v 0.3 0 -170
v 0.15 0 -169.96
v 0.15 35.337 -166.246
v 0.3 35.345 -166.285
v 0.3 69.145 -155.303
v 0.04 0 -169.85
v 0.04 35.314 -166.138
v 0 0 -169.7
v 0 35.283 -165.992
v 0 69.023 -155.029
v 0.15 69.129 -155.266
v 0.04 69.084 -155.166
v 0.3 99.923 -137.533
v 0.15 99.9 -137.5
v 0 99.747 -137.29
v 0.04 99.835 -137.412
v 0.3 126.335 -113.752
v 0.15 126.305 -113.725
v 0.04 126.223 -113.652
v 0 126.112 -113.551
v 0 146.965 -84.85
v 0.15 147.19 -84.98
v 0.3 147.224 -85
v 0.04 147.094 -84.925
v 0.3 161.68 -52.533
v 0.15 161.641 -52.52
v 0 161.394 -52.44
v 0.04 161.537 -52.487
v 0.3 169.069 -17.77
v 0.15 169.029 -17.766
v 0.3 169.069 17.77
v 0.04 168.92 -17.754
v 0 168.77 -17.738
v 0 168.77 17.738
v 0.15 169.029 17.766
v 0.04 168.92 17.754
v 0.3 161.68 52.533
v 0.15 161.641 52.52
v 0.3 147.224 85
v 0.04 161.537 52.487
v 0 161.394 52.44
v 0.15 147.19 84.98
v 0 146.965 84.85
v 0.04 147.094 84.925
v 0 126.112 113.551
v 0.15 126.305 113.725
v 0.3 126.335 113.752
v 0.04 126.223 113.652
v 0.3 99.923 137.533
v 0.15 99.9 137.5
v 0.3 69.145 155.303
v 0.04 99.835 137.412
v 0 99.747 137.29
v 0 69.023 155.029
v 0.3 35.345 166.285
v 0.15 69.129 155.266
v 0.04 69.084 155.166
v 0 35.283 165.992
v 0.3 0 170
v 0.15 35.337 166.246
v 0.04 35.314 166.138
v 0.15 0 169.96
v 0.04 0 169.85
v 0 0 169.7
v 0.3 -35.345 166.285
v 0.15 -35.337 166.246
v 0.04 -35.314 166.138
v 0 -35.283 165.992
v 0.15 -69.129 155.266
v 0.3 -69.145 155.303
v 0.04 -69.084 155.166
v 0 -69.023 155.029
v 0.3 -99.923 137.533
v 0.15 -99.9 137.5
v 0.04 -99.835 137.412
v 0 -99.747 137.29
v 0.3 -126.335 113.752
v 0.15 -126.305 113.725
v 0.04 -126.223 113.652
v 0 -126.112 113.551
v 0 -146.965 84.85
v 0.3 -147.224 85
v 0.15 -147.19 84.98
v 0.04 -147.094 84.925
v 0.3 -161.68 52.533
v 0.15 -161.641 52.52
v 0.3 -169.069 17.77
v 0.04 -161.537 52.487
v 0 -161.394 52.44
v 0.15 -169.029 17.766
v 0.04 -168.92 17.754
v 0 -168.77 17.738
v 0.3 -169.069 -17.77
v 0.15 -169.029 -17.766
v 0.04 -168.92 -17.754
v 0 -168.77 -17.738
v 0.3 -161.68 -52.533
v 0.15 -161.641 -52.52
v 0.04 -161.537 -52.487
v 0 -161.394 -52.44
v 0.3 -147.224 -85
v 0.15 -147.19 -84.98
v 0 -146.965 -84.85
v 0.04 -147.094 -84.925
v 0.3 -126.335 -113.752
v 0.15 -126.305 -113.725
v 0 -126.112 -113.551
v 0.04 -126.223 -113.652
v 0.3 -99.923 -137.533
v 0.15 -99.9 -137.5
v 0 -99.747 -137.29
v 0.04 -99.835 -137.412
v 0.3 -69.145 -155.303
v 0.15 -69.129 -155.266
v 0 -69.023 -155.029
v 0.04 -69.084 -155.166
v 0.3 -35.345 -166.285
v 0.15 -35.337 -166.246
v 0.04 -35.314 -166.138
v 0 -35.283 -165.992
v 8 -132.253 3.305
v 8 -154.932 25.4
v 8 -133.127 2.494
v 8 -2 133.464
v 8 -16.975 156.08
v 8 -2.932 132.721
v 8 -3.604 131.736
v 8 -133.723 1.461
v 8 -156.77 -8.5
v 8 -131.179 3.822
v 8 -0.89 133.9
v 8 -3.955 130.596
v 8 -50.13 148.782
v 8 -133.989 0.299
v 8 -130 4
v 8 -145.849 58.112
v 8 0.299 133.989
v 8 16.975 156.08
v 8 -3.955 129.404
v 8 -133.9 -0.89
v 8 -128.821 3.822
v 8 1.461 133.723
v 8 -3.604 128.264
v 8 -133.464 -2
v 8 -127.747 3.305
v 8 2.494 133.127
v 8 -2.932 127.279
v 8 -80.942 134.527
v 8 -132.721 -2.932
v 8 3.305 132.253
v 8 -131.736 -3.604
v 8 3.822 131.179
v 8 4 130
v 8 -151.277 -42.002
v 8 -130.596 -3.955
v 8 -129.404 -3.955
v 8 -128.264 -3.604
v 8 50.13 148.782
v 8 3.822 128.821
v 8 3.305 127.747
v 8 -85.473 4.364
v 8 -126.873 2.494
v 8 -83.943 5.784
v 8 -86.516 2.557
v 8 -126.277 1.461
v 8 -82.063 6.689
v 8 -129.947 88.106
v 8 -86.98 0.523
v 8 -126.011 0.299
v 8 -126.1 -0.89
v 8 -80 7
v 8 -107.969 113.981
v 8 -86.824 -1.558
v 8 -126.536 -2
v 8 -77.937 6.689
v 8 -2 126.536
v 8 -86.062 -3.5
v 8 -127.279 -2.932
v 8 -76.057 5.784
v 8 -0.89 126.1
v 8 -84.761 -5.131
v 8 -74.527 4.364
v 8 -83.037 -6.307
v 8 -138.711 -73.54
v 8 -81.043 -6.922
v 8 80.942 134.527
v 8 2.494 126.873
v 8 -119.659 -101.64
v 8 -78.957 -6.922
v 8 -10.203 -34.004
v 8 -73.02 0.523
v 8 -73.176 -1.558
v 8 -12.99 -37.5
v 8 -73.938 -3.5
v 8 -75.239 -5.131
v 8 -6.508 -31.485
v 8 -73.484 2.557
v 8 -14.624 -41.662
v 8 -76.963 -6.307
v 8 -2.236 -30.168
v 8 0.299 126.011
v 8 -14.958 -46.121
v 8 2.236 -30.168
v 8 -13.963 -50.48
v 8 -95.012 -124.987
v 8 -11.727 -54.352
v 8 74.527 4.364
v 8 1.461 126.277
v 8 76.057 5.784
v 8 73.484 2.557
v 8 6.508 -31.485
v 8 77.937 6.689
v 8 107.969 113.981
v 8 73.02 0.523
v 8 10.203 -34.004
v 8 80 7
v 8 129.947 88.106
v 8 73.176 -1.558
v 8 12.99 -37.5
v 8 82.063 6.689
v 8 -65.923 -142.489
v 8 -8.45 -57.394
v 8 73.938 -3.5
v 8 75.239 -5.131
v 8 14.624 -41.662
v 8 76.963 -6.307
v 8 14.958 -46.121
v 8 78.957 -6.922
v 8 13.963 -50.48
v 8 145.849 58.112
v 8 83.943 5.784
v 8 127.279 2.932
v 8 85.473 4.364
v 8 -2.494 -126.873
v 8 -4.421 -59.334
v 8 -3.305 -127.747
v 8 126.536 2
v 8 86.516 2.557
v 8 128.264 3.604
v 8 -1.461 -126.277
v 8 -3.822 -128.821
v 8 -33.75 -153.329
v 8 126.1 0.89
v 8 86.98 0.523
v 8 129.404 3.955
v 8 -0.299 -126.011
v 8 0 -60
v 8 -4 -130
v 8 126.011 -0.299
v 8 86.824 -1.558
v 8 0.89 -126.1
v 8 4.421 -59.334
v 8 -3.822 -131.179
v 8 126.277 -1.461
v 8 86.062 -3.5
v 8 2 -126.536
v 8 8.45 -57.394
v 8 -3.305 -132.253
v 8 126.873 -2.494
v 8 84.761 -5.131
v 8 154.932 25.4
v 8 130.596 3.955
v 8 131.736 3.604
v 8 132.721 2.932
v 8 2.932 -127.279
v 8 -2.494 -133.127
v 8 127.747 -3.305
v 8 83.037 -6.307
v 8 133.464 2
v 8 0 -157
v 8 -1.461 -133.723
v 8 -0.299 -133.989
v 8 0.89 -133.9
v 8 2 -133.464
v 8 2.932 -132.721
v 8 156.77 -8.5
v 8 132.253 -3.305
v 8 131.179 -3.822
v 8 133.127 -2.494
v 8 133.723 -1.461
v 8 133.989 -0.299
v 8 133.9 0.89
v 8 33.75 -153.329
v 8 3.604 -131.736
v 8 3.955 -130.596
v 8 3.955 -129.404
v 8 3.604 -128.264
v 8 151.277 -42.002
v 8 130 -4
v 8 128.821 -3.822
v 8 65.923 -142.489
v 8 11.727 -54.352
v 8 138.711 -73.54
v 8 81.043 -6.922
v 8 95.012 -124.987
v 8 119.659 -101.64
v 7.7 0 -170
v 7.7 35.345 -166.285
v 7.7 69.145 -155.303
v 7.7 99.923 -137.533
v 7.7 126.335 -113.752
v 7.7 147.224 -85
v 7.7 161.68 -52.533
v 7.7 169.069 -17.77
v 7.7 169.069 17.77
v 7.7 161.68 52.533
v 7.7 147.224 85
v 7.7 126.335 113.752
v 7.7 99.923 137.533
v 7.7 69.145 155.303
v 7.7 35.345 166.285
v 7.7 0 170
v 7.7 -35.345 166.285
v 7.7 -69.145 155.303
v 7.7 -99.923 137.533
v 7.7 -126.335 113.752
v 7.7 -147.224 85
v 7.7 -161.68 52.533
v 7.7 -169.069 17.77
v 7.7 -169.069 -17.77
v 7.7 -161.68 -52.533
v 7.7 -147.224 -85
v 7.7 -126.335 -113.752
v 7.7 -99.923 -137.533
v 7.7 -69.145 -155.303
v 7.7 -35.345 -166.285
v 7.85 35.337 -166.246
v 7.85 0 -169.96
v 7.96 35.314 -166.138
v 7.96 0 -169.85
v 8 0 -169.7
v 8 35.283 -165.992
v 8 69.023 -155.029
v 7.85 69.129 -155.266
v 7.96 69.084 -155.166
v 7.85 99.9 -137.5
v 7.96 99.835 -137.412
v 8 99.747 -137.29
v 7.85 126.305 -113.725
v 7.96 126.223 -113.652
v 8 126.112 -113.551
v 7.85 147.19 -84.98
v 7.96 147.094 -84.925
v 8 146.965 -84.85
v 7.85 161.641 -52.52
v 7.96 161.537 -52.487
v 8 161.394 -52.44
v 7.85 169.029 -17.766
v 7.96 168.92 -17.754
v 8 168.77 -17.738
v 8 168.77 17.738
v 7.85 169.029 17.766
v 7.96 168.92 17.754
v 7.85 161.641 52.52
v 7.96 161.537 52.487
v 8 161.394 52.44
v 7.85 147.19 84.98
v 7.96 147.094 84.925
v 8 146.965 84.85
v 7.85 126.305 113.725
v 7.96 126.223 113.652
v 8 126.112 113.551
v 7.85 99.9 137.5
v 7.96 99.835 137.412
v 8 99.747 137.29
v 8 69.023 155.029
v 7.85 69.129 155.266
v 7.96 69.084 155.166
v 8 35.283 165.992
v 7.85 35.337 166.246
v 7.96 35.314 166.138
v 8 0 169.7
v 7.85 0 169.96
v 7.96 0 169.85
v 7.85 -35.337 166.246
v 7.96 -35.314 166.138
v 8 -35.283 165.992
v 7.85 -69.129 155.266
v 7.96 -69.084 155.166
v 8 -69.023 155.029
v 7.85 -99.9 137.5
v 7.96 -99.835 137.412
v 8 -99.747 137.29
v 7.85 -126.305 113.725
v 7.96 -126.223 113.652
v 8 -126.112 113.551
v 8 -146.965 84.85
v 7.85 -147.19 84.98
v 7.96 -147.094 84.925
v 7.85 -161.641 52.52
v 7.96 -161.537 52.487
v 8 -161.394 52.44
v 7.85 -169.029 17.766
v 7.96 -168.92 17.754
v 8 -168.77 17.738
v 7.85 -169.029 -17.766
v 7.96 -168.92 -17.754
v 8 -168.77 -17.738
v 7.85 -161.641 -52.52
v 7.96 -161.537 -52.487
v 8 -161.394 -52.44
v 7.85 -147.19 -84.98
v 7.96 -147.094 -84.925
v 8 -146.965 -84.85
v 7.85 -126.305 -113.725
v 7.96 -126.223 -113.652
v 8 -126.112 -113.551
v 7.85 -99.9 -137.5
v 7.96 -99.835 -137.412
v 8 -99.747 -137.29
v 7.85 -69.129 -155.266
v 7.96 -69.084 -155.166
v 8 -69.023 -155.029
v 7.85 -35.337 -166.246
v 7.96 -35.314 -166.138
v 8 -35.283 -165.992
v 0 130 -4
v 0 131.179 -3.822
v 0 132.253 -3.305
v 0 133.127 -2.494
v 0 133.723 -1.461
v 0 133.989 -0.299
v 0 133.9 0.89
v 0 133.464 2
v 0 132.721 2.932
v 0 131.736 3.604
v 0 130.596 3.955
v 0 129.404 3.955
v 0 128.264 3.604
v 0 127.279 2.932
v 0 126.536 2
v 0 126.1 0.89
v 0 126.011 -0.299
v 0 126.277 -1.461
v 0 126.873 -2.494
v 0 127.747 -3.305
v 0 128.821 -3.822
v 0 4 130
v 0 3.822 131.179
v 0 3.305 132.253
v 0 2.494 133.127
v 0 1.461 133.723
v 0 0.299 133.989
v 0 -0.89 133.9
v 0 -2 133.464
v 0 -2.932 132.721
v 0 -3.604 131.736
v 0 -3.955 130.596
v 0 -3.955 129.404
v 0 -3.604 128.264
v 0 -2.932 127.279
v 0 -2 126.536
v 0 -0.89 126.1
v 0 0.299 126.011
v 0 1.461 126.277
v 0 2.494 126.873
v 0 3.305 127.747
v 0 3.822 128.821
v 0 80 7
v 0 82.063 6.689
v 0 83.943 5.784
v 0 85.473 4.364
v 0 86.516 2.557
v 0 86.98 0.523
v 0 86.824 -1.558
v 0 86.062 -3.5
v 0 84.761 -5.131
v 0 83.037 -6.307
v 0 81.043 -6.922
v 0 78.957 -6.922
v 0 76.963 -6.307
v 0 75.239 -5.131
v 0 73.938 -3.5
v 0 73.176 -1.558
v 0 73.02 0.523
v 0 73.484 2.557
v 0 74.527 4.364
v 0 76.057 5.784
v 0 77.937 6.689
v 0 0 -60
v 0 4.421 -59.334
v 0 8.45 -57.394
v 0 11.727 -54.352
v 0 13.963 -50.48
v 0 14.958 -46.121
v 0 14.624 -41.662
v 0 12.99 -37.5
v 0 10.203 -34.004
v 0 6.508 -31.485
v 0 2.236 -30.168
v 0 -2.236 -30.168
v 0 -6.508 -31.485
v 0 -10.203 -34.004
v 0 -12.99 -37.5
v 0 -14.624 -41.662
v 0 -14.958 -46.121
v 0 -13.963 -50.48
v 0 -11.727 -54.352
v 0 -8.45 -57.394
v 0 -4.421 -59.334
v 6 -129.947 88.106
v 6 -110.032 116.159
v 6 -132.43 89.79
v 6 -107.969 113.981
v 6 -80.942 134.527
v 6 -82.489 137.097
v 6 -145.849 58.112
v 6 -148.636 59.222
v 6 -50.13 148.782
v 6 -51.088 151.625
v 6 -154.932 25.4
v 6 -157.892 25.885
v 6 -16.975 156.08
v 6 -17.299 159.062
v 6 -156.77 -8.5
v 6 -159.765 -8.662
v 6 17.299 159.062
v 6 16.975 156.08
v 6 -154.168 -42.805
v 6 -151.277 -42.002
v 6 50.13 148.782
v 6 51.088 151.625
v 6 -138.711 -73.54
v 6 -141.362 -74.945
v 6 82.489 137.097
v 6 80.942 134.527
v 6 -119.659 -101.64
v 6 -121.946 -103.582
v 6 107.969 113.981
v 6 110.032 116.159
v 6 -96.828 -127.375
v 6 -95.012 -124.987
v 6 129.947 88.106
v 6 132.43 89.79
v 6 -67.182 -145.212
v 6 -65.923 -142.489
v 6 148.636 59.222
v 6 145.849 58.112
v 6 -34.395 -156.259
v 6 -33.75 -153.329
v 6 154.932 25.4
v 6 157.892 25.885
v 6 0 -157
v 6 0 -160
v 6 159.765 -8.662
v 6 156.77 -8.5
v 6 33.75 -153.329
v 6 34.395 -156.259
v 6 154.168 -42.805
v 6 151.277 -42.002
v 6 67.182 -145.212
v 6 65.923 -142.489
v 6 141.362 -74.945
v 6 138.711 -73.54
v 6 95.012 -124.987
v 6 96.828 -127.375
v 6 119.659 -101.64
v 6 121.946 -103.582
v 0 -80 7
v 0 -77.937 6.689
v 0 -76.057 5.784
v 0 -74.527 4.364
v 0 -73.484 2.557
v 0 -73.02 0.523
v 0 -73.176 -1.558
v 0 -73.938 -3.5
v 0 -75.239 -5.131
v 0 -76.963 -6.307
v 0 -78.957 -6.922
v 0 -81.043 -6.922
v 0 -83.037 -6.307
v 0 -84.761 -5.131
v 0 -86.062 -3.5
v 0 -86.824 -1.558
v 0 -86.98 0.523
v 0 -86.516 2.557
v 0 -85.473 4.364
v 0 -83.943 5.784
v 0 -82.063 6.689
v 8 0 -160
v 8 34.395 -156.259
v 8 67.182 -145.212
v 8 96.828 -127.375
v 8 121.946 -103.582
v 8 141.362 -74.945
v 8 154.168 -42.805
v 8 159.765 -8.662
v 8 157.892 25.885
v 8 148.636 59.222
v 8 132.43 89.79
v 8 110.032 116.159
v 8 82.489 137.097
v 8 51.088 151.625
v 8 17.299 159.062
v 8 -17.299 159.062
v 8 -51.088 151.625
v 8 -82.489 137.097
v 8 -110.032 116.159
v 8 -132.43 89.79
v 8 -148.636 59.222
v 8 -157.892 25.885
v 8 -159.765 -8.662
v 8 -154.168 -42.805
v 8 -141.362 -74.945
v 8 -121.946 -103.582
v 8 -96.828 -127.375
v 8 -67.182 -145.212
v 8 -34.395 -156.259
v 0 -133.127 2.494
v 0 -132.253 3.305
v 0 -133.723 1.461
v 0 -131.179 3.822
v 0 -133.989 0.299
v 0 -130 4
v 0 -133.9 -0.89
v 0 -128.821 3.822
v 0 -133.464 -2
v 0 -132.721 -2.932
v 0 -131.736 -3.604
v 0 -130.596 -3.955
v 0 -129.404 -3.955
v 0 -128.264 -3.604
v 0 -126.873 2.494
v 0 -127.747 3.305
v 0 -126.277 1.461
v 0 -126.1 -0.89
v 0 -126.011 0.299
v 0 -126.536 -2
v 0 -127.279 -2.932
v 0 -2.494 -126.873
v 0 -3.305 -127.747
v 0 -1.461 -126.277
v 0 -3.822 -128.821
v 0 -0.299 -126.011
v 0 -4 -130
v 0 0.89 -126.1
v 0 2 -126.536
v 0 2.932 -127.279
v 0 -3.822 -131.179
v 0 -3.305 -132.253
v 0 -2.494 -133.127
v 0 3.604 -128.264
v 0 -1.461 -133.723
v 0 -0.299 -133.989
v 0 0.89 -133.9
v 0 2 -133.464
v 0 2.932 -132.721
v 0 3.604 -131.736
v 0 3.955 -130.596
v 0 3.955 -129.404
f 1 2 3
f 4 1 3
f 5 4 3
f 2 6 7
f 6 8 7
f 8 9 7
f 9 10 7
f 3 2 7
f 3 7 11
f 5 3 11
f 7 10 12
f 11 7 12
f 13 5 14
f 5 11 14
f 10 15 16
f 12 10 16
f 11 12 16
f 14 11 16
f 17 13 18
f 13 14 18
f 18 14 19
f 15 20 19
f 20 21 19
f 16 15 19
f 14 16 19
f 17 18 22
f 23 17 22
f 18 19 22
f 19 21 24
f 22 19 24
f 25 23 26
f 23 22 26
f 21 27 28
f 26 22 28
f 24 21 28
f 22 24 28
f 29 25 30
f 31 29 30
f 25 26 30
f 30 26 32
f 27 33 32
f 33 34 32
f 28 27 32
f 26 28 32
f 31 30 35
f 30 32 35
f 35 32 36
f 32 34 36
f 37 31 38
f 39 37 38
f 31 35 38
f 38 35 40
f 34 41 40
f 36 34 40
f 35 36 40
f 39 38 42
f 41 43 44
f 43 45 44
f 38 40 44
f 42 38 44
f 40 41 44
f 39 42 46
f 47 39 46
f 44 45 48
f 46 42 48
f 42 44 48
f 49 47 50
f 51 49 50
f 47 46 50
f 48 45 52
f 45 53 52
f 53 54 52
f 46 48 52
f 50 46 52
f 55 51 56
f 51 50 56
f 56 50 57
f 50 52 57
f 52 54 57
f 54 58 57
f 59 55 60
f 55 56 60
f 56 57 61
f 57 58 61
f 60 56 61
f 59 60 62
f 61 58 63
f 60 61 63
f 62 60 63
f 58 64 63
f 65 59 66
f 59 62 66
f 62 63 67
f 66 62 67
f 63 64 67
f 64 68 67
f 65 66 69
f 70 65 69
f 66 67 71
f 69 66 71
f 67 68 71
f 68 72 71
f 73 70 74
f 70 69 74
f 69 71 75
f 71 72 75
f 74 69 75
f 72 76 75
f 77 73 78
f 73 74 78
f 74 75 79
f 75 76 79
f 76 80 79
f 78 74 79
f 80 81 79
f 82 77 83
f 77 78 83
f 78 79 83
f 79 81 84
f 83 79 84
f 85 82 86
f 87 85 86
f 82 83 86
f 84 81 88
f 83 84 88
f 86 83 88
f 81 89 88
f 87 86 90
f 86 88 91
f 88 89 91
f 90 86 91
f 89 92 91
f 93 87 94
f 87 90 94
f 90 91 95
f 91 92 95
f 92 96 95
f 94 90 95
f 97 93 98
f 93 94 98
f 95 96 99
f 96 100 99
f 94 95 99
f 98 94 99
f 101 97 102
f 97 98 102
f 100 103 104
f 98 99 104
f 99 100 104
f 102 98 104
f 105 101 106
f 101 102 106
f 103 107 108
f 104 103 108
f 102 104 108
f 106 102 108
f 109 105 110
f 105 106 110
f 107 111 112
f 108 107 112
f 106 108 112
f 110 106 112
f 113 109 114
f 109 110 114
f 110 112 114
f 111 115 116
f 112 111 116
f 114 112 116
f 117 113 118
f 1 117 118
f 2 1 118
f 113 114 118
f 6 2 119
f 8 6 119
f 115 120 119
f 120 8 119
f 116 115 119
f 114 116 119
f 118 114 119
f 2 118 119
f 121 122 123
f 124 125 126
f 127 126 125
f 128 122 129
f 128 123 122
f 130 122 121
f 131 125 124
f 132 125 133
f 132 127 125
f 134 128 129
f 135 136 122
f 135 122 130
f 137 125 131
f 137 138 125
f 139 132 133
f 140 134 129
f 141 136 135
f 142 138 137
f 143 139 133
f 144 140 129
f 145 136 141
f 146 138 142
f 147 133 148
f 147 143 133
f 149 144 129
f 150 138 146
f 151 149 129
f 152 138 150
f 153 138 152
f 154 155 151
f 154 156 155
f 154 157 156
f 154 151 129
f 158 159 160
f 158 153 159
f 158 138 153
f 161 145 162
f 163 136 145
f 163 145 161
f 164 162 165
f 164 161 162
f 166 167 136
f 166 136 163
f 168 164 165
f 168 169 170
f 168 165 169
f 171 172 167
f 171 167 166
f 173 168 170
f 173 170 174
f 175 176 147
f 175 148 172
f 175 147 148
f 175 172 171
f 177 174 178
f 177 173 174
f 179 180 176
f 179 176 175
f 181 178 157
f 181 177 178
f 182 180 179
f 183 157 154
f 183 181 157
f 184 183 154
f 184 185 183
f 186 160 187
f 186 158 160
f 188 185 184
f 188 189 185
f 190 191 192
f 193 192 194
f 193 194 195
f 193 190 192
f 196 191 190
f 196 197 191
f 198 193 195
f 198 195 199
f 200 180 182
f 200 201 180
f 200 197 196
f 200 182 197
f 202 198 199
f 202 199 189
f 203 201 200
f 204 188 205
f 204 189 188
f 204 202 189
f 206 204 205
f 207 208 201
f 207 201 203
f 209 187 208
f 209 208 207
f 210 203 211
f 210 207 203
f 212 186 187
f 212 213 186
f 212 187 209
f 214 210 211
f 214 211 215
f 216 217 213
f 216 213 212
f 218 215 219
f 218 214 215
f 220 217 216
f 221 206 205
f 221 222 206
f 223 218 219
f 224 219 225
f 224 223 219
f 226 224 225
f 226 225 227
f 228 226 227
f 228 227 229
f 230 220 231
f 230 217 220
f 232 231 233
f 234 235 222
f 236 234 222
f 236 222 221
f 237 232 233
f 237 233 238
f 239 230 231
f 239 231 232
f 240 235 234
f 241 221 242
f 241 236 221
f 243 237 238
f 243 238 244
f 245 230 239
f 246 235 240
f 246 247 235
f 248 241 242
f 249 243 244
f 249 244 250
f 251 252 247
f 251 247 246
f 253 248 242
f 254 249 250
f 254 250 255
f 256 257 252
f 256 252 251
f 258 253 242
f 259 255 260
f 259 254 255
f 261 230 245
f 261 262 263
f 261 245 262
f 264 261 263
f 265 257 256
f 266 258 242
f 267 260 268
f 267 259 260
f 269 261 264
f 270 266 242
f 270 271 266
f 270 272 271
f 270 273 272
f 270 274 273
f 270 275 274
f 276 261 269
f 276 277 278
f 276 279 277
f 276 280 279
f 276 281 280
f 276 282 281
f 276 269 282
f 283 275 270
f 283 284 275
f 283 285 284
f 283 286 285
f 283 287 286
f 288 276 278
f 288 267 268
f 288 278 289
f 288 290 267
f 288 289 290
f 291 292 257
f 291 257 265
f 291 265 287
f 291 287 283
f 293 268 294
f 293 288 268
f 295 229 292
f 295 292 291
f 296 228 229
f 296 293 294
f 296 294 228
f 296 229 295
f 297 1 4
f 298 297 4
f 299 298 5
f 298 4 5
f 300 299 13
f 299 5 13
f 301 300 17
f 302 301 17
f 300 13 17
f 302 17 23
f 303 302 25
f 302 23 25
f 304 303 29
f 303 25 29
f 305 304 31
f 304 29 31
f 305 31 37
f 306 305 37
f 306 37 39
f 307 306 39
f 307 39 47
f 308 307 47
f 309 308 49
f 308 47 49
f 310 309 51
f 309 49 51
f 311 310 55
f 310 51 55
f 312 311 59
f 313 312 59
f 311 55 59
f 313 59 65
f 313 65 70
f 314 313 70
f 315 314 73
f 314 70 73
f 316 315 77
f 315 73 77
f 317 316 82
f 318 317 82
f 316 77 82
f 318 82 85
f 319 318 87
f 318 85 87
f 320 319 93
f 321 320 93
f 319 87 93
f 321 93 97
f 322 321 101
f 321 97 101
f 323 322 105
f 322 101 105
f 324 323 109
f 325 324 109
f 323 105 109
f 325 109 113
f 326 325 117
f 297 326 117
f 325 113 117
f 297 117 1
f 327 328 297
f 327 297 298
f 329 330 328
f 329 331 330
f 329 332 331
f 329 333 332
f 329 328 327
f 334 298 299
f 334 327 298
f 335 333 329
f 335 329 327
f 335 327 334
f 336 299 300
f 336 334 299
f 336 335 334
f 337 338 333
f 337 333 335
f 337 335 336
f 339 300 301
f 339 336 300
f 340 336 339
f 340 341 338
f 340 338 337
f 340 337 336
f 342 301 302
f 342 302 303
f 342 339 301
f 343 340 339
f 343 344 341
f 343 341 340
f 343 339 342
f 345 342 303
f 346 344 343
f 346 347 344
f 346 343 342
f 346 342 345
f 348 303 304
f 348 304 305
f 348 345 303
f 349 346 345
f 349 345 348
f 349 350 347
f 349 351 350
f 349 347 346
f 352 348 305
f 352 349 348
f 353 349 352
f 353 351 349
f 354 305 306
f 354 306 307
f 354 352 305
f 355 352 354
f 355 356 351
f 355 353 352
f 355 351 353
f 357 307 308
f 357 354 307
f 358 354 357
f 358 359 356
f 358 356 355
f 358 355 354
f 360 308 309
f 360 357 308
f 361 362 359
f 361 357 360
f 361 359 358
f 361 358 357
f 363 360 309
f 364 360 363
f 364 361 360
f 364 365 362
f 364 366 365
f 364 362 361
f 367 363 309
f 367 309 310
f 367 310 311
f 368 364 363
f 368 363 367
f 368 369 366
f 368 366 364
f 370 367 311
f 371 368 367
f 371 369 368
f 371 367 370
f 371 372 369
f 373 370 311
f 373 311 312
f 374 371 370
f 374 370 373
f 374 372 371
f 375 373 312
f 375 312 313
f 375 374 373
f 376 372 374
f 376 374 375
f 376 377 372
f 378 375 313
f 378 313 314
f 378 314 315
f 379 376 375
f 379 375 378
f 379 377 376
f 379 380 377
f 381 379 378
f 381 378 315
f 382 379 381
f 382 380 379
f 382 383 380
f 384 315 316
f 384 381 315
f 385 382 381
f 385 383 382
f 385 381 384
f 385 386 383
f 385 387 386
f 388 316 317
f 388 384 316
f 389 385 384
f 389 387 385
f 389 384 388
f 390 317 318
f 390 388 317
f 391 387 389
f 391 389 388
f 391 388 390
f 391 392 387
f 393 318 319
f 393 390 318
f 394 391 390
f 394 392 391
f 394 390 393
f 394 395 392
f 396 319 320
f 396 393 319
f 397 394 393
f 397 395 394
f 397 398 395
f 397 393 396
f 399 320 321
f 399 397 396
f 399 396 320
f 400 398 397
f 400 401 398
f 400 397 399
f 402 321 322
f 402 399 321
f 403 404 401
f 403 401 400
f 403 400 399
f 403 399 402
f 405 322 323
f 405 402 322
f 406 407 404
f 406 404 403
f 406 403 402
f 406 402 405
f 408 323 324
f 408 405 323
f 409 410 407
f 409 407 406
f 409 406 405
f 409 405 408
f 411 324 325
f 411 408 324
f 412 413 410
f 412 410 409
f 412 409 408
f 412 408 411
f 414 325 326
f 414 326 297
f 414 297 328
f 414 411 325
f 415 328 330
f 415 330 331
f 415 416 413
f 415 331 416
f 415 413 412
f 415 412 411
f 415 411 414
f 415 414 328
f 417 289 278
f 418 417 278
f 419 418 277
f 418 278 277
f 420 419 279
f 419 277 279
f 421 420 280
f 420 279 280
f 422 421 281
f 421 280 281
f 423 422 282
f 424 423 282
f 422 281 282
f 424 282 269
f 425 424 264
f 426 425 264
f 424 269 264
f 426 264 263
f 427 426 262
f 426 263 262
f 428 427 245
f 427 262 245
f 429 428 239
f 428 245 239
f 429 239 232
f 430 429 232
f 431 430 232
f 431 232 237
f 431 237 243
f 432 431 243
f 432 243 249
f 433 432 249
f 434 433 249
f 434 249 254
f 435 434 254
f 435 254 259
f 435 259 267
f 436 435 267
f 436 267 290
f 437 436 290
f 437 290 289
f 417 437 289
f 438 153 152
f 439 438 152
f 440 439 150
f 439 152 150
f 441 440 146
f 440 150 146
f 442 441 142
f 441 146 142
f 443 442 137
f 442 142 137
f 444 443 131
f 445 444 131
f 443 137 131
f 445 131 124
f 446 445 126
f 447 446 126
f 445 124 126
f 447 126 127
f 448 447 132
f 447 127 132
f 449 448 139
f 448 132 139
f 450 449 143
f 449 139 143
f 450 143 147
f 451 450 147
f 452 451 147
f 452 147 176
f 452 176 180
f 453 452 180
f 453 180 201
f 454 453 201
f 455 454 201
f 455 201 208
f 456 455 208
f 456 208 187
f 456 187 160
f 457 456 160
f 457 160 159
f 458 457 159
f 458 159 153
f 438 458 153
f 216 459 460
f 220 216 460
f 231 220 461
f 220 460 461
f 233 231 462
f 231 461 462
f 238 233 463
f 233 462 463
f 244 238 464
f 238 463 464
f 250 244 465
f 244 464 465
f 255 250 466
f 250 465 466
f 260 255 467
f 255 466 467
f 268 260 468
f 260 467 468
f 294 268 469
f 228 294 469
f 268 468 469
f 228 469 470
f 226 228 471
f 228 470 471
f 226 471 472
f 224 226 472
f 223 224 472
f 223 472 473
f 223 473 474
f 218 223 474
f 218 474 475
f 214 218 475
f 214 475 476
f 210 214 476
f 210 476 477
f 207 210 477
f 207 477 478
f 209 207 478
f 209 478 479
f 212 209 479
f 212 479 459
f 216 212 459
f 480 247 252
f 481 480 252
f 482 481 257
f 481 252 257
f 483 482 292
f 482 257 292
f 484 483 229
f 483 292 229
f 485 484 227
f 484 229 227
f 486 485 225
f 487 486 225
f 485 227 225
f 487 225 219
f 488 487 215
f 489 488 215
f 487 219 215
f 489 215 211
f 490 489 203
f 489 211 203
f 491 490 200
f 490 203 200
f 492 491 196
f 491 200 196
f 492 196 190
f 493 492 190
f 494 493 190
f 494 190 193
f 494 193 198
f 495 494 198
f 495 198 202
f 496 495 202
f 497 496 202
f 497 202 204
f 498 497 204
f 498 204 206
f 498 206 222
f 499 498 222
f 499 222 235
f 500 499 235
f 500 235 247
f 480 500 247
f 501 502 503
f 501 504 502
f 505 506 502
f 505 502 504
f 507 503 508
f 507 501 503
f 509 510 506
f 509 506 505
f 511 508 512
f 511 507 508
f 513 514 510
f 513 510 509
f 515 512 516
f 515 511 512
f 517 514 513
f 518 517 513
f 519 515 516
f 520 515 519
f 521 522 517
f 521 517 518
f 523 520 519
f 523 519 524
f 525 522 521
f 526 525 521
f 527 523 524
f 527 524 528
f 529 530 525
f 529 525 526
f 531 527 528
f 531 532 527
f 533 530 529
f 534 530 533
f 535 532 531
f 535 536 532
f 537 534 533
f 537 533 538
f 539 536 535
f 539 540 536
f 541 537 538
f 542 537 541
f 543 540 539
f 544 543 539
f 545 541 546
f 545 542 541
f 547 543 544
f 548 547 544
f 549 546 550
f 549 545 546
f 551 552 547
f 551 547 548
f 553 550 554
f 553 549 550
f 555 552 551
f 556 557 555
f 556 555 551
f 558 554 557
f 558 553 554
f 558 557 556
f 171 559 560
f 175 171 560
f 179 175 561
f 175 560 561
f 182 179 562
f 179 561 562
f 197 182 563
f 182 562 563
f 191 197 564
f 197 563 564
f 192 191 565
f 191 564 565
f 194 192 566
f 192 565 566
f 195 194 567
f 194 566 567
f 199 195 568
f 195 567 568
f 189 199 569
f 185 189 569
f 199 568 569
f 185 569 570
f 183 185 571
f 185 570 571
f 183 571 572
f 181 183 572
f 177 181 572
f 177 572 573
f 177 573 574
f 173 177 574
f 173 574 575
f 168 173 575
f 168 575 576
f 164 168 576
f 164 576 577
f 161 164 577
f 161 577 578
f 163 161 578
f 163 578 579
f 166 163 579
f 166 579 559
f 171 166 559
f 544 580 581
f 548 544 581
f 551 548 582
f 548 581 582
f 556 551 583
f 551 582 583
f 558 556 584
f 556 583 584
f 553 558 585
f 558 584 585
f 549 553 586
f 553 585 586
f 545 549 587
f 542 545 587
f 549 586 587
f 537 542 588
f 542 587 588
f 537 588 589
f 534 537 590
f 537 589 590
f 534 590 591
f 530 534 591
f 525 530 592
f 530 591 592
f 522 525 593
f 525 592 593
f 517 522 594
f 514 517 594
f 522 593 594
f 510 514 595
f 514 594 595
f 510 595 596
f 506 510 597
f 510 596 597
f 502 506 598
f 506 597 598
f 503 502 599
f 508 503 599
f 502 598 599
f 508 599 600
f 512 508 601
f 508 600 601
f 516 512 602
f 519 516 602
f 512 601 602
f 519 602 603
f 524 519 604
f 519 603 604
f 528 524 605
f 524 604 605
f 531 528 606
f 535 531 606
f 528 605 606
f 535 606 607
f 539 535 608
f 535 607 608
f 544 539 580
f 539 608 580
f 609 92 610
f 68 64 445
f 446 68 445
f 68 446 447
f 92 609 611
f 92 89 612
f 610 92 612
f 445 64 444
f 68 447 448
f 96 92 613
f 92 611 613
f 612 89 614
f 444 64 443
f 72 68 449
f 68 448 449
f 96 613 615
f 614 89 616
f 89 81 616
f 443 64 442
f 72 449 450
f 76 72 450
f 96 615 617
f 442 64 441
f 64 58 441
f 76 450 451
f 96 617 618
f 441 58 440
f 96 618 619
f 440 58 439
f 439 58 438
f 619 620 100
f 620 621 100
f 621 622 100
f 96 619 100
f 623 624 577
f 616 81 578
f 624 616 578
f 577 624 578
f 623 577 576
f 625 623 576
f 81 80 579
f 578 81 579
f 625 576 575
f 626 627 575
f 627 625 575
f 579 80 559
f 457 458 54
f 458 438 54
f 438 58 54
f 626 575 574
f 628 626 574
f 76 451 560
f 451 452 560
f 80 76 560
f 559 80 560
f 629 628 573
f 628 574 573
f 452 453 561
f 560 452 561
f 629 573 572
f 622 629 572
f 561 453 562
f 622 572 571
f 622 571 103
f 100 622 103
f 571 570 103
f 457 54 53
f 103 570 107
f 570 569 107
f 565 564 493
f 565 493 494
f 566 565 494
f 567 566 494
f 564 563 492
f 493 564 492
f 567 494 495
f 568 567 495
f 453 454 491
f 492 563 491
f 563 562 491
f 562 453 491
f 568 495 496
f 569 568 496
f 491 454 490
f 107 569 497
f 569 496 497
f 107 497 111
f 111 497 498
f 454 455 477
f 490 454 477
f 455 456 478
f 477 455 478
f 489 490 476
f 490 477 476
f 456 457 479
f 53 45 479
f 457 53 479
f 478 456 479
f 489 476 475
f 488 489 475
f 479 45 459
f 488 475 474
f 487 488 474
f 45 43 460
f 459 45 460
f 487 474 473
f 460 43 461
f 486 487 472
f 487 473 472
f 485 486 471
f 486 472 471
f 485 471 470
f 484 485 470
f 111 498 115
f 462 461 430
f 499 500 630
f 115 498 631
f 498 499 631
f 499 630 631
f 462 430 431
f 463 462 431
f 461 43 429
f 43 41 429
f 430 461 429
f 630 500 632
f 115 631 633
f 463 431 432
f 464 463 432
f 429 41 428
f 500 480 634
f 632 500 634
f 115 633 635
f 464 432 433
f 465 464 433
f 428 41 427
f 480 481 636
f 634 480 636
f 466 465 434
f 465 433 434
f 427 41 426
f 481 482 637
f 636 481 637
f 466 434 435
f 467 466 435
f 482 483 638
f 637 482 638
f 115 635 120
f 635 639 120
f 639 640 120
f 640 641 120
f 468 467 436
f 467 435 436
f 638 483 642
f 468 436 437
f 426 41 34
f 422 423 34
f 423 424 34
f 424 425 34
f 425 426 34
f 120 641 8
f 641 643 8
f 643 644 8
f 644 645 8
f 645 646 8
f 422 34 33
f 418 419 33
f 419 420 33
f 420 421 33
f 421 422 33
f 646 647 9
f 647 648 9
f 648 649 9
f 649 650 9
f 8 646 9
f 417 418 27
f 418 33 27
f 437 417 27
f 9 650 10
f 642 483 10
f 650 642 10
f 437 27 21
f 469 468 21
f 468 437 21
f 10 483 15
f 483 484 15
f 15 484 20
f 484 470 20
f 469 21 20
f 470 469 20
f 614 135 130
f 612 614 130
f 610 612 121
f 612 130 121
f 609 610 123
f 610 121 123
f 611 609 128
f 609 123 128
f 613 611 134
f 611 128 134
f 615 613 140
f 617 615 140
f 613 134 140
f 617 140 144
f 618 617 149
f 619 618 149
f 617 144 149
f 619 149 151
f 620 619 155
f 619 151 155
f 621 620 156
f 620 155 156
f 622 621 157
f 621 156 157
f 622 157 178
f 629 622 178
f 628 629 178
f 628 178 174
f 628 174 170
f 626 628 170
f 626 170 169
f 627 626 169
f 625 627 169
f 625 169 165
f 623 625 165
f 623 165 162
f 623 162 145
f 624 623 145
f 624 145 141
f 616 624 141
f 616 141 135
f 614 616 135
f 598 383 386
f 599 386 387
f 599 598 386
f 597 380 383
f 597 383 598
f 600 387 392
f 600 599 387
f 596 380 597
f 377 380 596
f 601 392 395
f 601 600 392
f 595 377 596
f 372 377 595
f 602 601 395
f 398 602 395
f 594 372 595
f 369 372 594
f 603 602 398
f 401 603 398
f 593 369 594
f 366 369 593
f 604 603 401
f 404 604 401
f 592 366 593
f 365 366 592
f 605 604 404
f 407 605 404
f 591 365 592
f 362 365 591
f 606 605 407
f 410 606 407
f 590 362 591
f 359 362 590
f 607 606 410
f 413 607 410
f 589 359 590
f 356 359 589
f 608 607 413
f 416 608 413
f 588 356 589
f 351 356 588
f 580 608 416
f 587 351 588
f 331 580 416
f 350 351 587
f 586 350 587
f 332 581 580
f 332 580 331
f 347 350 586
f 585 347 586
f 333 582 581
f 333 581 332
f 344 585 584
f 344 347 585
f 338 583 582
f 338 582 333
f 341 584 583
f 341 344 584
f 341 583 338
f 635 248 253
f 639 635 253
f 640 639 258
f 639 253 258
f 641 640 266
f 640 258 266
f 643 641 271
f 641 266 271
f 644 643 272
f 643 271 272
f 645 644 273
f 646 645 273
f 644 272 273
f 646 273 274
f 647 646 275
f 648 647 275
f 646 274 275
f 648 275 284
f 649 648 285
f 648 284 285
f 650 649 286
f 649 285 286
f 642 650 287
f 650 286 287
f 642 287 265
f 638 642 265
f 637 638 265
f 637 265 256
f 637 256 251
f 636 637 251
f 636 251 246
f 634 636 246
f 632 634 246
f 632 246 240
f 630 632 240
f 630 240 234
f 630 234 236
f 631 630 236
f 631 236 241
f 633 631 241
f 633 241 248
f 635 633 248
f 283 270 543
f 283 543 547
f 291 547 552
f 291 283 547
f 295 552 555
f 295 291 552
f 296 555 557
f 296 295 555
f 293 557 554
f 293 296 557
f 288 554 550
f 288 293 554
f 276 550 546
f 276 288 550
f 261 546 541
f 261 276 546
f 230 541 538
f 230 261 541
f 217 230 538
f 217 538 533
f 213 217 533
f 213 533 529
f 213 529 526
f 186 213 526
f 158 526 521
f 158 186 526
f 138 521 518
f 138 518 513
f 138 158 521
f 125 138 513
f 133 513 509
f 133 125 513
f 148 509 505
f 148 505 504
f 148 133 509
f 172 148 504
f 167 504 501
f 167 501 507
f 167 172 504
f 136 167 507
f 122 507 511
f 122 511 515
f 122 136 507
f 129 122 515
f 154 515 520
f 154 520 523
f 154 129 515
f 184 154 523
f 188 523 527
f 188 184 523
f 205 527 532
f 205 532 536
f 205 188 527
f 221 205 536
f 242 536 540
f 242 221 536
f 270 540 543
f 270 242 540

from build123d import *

# Parameters (mm, degrees)
SKETCH_1_R               = 170
EXTRUDE_1_DEPTH          = 8
SKETCH_5_R               = 4
CUT_EXTRUDE_4_DEPTH      = 10
PATTERN_CIRCULAR_3_COUNT = 4
SKETCH_7_R               = 160
SKETCH_7_R_2             = 157
CUT_EXTRUDE_5_DEPTH      = 2
FILLET_1_R               = 0.3
SKETCH_8_R               = 15
CUT_EXTRUDE_6_DEPTH      = 10
SKETCH_10_R              = 7
CUT_EXTRUDE_7_DEPTH      = 10


with BuildPart() as part:
    # 草图1 → 凸台-拉伸1 (new body)
    with BuildSketch(Plane(origin=(0, 0, 0), x_dir=(0, 0, -1), z_dir=(1, 0, 0))):
        Circle(SKETCH_1_R)
    extrude(amount=EXTRUDE_1_DEPTH)

    # 草图5 → 切除-拉伸4 (cut)
    with BuildSketch(Plane(origin=(8, 0, 0), x_dir=(0, 0, -1), z_dir=(1, 0, 0))):
        with Locations((0, 130)):
            Circle(SKETCH_5_R)
    cut_extrude_4 = extrude(amount=-CUT_EXTRUDE_4_DEPTH, mode=Mode.SUBTRACT)

    # 阵列(圆周)3: 切除-拉伸4 ×4 about axis
    pattern_circular_3_axis = Axis((0, 0, 0), (1, 0, 0))
    for i in range(1, PATTERN_CIRCULAR_3_COUNT):
        add(cut_extrude_4.rotate(pattern_circular_3_axis, i * 360 / PATTERN_CIRCULAR_3_COUNT), mode=Mode.SUBTRACT)

    # 草图7 → 切除-拉伸5 (cut)
    with BuildSketch(Plane(origin=(8, 0, 0), x_dir=(0, 0, -1), z_dir=(1, 0, 0))):
        Circle(SKETCH_7_R)
        Circle(SKETCH_7_R_2, mode=Mode.SUBTRACT)
    extrude(amount=-CUT_EXTRUDE_5_DEPTH, mode=Mode.SUBTRACT)

    # 圆角1
    fillet_1_edges = [part.edges().sort_by_distance(p)[0] for p in [
        (0, 0, 170),
        (8, 0, 170),
    ]]
    fillet(fillet_1_edges, radius=FILLET_1_R)

    # 草图8 → 切除-拉伸6 (cut)
    with BuildSketch(Plane(origin=(8, 0, 0), x_dir=(0, 0, -1), z_dir=(1, 0, 0))):
        with Locations((45, 0)):
            Circle(SKETCH_8_R)
    extrude(amount=-CUT_EXTRUDE_6_DEPTH, mode=Mode.SUBTRACT)

    # 草图10 → 切除-拉伸7 (cut)
    with BuildSketch(Plane.ZY):
        with Locations((0, -80)):
            Circle(SKETCH_10_R)
        with Locations((0, 80)):
            Circle(SKETCH_10_R)
    extrude(amount=-CUT_EXTRUDE_7_DEPTH, mode=Mode.SUBTRACT)


solid = part.part
